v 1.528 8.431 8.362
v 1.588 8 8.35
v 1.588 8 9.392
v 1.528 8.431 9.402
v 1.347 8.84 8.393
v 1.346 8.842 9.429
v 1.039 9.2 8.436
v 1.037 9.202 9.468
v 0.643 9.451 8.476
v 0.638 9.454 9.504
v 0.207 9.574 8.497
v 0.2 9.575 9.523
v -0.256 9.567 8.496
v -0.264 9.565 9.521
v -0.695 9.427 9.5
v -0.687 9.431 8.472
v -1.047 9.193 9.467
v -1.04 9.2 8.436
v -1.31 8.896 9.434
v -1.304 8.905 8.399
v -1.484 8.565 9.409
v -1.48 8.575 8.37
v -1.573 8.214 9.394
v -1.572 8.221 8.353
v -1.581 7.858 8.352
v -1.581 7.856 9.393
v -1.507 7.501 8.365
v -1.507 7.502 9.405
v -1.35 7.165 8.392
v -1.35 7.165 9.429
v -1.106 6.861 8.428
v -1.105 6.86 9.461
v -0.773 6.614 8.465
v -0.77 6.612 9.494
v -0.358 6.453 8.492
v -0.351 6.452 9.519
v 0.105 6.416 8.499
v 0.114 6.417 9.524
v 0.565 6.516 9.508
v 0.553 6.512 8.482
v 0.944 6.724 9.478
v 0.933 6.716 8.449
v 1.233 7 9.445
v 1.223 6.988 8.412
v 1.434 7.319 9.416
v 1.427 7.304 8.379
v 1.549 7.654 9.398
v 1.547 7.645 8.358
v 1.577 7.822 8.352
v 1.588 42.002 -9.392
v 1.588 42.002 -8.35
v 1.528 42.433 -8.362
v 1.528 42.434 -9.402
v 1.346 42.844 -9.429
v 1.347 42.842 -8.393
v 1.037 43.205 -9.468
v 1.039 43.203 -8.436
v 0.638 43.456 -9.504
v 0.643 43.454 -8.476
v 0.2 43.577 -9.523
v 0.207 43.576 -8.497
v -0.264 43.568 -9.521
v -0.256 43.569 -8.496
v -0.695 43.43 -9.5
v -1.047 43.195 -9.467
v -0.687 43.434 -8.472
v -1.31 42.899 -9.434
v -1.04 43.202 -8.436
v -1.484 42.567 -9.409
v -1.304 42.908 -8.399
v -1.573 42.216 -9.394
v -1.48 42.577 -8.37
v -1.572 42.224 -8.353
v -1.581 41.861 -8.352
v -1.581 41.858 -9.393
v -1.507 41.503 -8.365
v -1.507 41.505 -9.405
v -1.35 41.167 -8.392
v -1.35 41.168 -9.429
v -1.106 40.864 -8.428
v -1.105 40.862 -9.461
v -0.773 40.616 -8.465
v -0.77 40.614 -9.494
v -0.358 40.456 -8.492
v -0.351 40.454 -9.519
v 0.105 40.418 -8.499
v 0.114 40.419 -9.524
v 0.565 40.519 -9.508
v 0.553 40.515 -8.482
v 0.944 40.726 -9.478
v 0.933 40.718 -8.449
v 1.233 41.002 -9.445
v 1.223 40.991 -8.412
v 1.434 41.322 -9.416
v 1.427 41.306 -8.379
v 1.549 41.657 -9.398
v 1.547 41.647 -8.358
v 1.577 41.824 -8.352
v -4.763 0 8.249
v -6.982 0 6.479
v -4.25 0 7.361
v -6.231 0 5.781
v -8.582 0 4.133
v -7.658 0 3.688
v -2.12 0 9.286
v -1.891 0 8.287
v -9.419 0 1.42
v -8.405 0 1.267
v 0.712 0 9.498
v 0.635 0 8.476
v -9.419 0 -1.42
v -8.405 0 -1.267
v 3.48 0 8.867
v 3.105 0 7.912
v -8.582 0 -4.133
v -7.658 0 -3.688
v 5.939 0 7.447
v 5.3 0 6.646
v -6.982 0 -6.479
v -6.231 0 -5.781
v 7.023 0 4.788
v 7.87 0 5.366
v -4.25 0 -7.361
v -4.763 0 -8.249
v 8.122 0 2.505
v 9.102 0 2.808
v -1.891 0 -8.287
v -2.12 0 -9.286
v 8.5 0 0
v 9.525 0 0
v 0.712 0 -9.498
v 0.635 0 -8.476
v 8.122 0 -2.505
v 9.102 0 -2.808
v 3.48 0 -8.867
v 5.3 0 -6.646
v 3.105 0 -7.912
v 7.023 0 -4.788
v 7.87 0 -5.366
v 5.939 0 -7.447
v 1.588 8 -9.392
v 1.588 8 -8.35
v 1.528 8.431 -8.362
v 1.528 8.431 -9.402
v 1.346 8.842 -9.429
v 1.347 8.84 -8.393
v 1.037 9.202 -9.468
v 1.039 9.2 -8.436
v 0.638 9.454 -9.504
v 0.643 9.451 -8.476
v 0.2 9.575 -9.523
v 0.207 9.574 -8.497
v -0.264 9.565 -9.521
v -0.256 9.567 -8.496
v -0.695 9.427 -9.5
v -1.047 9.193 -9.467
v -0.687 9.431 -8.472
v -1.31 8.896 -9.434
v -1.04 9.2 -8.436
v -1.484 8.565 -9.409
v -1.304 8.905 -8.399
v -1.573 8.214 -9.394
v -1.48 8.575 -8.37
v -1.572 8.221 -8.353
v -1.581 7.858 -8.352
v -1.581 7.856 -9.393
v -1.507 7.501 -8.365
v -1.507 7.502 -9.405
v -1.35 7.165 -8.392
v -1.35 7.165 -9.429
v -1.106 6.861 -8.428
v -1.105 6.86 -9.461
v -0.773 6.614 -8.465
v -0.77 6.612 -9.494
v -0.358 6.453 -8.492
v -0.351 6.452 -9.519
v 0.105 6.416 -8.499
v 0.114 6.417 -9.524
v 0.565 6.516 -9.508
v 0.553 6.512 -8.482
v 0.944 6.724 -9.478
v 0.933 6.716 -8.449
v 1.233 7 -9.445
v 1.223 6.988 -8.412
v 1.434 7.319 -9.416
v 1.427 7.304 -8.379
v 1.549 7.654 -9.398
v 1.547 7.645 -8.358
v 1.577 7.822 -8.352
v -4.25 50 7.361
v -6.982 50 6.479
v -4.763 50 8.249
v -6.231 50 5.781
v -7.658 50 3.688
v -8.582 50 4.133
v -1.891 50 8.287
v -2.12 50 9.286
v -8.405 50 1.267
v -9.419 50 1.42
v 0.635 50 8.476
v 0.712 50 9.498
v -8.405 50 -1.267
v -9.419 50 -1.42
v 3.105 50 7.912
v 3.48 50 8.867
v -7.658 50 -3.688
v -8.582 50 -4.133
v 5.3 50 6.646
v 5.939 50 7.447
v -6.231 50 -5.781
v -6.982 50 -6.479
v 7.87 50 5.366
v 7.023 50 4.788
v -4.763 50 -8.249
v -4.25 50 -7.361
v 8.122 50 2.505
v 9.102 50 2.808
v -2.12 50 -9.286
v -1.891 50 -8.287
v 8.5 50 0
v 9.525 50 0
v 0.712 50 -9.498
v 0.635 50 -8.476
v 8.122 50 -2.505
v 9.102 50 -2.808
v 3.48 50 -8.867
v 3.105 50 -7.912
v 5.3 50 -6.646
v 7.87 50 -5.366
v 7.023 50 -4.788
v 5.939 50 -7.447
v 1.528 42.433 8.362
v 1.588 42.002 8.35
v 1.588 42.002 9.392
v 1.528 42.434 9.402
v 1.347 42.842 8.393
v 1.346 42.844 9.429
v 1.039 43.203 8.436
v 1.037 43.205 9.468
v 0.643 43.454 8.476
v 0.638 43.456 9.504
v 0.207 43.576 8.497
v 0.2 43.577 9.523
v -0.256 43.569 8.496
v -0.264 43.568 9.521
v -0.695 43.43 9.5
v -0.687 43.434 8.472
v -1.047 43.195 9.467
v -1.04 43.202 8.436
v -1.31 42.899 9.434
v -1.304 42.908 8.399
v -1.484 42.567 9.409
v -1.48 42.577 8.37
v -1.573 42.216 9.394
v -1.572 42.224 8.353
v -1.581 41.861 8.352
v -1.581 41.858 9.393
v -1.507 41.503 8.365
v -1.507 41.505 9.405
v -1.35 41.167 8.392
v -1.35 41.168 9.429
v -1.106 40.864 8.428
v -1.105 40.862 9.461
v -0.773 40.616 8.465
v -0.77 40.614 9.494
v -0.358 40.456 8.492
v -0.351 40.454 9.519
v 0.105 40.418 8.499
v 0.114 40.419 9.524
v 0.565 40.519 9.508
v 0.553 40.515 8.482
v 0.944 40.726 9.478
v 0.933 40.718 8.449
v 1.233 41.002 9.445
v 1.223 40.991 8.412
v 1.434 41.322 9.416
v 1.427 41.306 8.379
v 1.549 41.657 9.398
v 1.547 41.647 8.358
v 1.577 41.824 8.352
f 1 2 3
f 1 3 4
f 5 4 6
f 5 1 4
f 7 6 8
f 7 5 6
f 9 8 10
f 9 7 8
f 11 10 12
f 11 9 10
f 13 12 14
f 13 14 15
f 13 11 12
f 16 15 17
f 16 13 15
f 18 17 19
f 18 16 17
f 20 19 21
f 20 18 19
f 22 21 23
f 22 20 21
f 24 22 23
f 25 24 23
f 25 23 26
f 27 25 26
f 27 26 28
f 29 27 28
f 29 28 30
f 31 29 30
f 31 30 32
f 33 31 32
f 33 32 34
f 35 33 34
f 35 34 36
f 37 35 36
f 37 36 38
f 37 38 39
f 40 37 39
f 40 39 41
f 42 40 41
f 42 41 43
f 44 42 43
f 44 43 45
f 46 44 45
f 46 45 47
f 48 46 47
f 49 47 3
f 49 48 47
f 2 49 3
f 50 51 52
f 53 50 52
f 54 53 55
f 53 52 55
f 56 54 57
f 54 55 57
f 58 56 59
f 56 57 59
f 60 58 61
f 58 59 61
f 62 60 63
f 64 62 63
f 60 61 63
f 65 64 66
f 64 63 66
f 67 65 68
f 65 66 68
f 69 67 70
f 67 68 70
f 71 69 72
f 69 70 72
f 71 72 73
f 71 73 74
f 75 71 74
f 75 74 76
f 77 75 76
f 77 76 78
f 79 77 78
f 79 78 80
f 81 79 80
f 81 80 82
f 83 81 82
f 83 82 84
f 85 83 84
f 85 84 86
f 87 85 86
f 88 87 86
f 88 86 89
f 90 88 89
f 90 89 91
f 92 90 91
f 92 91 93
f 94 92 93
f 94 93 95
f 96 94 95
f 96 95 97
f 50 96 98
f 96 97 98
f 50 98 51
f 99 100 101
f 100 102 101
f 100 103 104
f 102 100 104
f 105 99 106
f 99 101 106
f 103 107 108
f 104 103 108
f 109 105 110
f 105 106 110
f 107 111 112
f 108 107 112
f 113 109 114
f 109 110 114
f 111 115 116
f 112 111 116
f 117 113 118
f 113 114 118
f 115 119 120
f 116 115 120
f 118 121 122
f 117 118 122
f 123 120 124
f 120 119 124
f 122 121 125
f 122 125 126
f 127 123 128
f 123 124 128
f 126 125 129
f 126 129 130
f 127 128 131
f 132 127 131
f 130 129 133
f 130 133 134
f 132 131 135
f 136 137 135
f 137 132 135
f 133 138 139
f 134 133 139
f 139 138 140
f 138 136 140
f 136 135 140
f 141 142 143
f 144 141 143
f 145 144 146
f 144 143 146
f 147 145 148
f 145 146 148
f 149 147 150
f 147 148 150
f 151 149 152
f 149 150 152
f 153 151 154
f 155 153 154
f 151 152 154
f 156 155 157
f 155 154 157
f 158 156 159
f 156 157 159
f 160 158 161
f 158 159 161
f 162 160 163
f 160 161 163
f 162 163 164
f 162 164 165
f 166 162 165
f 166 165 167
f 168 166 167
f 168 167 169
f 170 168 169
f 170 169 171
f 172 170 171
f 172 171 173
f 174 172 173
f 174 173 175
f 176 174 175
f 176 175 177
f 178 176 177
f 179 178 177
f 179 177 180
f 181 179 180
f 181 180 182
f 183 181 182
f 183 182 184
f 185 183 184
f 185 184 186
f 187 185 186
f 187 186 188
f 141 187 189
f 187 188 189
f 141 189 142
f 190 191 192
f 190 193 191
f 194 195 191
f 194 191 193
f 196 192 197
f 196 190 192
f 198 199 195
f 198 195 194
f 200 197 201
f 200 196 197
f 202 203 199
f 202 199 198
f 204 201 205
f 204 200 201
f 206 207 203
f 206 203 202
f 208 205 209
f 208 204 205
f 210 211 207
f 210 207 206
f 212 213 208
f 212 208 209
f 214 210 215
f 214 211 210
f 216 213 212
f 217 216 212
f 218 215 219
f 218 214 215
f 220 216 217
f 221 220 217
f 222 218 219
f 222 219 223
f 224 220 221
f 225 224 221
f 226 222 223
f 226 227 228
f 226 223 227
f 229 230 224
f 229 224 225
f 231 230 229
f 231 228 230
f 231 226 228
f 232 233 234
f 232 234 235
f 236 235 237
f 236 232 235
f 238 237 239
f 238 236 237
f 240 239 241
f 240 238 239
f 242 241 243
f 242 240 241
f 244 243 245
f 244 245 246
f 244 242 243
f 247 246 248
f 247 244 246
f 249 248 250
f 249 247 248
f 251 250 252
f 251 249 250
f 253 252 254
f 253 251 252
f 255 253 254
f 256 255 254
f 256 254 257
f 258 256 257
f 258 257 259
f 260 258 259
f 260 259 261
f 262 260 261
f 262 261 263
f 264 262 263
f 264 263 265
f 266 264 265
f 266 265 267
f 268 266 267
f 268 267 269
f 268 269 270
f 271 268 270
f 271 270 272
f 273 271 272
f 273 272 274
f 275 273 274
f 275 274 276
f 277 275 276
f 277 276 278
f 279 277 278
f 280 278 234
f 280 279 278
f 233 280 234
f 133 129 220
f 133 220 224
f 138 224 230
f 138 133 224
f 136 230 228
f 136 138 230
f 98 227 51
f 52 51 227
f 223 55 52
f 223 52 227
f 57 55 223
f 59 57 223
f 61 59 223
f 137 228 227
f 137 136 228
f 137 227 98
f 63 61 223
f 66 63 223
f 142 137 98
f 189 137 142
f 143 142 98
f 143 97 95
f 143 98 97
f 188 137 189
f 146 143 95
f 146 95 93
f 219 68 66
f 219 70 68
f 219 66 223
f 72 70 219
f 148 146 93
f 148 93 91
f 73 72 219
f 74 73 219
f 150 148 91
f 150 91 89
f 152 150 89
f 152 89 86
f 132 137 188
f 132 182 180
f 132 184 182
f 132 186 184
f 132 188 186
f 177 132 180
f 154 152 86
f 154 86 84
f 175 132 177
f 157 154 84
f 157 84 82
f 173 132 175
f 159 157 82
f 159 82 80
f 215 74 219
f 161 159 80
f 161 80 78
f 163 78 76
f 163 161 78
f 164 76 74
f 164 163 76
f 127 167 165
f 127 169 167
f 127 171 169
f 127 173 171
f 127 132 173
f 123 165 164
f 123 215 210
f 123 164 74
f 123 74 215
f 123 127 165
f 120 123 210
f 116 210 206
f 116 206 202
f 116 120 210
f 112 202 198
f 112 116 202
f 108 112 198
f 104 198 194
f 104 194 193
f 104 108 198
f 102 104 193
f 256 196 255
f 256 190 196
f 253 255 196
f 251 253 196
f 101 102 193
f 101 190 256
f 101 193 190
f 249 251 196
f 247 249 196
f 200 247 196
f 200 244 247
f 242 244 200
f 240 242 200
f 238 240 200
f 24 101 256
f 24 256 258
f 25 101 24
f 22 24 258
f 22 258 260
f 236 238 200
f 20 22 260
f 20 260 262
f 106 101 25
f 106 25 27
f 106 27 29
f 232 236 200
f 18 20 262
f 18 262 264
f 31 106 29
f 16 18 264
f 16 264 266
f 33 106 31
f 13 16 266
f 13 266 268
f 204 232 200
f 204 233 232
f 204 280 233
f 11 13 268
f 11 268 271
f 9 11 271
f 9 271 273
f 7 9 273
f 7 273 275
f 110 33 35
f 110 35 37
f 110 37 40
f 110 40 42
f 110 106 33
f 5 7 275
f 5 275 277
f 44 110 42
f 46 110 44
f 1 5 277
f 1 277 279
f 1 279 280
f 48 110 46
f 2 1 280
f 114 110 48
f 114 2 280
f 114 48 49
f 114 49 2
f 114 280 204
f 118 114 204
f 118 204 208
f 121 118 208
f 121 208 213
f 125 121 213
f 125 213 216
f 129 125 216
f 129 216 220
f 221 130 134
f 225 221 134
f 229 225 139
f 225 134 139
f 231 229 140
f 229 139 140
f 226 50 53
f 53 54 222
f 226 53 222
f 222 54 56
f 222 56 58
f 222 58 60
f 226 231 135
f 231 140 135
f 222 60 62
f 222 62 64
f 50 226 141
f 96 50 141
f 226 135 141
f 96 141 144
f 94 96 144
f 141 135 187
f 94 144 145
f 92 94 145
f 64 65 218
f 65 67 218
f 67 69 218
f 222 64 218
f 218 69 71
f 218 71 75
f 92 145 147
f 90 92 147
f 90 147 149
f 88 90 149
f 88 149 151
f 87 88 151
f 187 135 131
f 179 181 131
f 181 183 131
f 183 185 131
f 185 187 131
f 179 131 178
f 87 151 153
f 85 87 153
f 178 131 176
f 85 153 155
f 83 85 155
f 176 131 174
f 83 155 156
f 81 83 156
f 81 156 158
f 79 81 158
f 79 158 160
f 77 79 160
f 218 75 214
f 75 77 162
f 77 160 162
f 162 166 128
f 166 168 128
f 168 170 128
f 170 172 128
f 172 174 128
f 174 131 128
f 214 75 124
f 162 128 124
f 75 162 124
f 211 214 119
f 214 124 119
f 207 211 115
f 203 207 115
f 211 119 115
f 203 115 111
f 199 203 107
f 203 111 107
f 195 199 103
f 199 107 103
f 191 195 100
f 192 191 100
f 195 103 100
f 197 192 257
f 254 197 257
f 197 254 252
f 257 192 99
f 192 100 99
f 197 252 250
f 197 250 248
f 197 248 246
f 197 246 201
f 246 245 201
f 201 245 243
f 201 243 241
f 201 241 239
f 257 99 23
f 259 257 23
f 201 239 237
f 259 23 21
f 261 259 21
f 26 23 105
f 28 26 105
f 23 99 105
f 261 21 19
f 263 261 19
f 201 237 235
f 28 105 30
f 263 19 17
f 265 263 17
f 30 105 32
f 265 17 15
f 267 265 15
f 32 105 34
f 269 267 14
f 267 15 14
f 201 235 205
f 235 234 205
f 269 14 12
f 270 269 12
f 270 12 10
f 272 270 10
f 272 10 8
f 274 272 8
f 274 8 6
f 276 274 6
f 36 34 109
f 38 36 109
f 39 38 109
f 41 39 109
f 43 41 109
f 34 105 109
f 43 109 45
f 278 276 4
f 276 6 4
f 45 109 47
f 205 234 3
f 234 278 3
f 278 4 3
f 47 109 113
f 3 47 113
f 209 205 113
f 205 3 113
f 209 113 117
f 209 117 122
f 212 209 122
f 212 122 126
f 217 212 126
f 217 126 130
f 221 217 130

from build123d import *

# Parameters (mm, degrees)
CROQUIS2_R                 = 9.525
CROQUIS2_R_2               = 8.5
SALIENTE_EXTRUIR1_DEPTH    = 50
CROQUIS3_R                 = 1.5875
CORTAR_EXTRUIR1_DEPTH      = 10.525
CORTAR_EXTRUIR1_DEPTH_BACK = 10.525


with BuildPart() as part:
    # Croquis2 → Saliente-Extruir1 (new body)
    with BuildSketch(Plane(origin=(0, 0, 0), x_dir=(1, 0, 0), z_dir=(0, 1, 0))):
        Circle(CROQUIS2_R)
        Circle(CROQUIS2_R_2, mode=Mode.SUBTRACT)
    extrude(amount=SALIENTE_EXTRUIR1_DEPTH)

    # Croquis3 → Cortar-Extruir1 (cut, two sides)
    with BuildSketch(Plane.XY) as cortar_extruir1_sk:
        with Locations((0, 42.0025)):
            Circle(CROQUIS3_R)
        with Locations((0, 8)):
            Circle(CROQUIS3_R)
    extrude(amount=CORTAR_EXTRUIR1_DEPTH, mode=Mode.SUBTRACT)
    extrude(cortar_extruir1_sk.sketch, amount=-CORTAR_EXTRUIR1_DEPTH_BACK, mode=Mode.SUBTRACT)


solid = part.part
